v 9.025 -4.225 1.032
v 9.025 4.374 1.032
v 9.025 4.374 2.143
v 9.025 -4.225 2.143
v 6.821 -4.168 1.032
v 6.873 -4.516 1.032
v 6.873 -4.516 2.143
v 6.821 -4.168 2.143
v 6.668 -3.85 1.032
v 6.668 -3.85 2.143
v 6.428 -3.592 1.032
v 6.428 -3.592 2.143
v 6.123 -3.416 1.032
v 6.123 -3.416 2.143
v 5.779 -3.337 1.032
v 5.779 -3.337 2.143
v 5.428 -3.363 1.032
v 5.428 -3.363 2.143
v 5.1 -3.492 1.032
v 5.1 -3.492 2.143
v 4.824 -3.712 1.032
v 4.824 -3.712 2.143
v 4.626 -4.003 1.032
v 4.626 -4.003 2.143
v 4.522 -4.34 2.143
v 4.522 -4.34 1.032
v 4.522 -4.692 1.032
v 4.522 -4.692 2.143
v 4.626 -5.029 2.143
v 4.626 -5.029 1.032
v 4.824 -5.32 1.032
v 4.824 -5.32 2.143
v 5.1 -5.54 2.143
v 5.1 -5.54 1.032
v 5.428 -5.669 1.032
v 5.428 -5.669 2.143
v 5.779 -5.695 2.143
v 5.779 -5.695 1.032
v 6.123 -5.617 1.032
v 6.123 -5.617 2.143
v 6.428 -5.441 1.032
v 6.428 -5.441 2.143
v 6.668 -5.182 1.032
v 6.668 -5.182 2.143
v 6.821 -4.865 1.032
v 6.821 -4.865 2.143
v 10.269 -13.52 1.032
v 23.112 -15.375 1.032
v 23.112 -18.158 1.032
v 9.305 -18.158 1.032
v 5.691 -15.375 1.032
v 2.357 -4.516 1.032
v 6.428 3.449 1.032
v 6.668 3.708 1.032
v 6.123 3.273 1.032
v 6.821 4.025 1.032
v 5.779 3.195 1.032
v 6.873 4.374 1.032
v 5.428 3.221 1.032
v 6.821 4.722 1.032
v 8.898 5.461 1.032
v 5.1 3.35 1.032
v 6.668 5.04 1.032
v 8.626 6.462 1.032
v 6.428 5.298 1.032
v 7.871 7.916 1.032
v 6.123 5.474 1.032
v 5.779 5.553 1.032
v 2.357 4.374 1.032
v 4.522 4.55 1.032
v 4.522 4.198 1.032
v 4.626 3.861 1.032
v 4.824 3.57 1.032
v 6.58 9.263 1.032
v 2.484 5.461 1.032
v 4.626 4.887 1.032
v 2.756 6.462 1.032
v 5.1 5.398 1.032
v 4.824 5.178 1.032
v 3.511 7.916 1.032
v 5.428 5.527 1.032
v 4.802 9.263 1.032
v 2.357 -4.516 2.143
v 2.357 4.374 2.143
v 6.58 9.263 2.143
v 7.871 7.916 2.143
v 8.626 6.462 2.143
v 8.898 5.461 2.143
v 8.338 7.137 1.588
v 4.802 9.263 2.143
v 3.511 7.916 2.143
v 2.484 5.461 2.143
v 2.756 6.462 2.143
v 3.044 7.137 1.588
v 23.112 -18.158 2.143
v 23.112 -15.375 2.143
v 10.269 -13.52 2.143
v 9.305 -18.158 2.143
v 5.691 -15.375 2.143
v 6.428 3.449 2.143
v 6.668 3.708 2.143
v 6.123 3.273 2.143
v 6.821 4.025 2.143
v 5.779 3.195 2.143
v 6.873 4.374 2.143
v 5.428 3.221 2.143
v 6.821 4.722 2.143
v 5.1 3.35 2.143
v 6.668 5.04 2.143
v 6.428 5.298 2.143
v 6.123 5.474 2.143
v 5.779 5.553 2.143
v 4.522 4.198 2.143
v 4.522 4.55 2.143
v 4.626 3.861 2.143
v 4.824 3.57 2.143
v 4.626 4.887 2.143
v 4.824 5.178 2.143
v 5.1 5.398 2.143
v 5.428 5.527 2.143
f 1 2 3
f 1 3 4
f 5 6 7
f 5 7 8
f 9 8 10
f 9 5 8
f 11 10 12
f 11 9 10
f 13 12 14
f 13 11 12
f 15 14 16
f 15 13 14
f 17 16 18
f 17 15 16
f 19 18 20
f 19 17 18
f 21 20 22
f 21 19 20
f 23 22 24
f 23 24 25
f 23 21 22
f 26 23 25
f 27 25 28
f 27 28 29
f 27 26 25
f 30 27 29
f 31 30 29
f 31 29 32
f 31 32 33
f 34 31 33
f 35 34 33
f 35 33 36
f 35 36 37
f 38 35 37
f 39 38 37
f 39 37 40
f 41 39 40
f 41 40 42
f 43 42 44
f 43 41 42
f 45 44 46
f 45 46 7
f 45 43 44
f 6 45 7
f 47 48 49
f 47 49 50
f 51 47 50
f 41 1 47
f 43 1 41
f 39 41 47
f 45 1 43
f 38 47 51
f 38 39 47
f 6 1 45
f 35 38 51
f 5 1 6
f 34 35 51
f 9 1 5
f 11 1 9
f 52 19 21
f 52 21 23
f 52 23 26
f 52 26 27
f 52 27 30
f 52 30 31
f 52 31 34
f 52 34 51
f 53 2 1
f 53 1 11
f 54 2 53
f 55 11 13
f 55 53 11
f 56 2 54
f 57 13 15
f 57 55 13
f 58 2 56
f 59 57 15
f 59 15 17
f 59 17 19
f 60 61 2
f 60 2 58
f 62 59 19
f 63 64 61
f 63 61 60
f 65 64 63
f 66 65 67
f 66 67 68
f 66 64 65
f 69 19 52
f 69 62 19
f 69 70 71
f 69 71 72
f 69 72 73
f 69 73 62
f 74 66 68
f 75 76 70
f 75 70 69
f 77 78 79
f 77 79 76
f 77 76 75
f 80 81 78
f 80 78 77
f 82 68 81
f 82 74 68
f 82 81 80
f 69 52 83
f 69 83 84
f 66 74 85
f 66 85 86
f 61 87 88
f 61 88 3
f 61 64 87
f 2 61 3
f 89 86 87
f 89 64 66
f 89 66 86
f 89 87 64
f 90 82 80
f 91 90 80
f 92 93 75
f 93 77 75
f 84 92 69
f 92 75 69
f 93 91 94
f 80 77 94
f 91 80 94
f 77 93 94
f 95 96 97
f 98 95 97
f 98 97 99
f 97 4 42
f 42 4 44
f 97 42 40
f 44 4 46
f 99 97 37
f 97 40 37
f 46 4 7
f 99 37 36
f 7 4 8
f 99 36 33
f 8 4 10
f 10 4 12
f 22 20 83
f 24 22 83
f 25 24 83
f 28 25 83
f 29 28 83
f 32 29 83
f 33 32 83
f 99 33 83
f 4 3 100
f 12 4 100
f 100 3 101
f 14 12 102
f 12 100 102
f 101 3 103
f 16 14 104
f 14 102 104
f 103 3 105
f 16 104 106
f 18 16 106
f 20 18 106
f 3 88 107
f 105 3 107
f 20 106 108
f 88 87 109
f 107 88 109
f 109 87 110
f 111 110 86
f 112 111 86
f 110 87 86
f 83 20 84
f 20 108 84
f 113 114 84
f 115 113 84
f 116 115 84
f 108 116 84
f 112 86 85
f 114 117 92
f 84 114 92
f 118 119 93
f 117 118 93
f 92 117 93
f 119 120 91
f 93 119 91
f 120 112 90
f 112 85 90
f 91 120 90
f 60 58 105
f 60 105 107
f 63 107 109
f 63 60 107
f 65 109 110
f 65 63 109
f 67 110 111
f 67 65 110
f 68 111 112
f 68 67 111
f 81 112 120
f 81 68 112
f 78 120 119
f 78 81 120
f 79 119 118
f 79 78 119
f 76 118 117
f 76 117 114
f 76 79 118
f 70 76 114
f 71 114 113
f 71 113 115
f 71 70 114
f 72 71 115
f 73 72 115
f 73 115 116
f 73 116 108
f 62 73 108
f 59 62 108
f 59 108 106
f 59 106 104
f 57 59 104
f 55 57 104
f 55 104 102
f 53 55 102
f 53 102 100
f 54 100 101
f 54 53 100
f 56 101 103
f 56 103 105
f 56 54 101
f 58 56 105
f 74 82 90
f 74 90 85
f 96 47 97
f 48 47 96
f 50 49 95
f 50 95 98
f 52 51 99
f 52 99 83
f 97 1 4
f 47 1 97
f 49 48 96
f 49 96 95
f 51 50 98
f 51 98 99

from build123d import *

# Parameters (mm, degrees)
SKETCH1_R           = 3.3782
BOSS_EXTRUDE1_DEPTH = 3.175
SCALE1_SCALE        = 0.35


with BuildPart() as part:
    # Sketch1 → Boss-Extrude1 (new body)
    with BuildSketch(Plane.XY):
        with BuildLine():
            Line((-2.54, 39.37), (2.54, 39.37))
            add(Edge.make_bspline(
                [(2.54, 39.37), (9.095418915, 34.201637521), (9.525, 25.4)],
                knots=[0, 0, 0, 1, 1, 1], degree=2))
            Line((9.525, 25.4), (9.525, 0.833077402))
            Line((9.525, 0.833077402), (13.080713372, -25.725670045))
            Line((13.080713372, -25.725670045), (49.772779476, -31.025635149))
            Line((49.772779476, -31.025635149), (49.772779476, -38.975582805))
            Line((49.772779476, -38.975582805), (10.326960053, -38.975582805))
            Line((10.326960053, -38.975582805), (0, -31.025635149))
            Line((0, -31.025635149), (-9.525, 0))
            Line((-9.525, 0), (-9.525, 25.4))
            add(Edge.make_bspline(
                [(-2.54, 39.37), (-9.095418915, 34.201637521), (-9.525, 25.4)],
                knots=[0, 0, 0, 1, 1, 1], degree=2))
        make_face()
        with Locations((0, 25.4)):
            Circle(SKETCH1_R, mode=Mode.SUBTRACT)
        Circle(SKETCH1_R, mode=Mode.SUBTRACT)
    extrude(amount=BOSS_EXTRUDE1_DEPTH)


with BuildPart() as part_1:
    # Scale1: scaled about (8.755454484, -6.947922753, 1.5875)
    add(part.part.scale(SCALE1_SCALE).moved(Location((5.691045415, -4.516149789, 1.031875))))


solid = part_1.part
